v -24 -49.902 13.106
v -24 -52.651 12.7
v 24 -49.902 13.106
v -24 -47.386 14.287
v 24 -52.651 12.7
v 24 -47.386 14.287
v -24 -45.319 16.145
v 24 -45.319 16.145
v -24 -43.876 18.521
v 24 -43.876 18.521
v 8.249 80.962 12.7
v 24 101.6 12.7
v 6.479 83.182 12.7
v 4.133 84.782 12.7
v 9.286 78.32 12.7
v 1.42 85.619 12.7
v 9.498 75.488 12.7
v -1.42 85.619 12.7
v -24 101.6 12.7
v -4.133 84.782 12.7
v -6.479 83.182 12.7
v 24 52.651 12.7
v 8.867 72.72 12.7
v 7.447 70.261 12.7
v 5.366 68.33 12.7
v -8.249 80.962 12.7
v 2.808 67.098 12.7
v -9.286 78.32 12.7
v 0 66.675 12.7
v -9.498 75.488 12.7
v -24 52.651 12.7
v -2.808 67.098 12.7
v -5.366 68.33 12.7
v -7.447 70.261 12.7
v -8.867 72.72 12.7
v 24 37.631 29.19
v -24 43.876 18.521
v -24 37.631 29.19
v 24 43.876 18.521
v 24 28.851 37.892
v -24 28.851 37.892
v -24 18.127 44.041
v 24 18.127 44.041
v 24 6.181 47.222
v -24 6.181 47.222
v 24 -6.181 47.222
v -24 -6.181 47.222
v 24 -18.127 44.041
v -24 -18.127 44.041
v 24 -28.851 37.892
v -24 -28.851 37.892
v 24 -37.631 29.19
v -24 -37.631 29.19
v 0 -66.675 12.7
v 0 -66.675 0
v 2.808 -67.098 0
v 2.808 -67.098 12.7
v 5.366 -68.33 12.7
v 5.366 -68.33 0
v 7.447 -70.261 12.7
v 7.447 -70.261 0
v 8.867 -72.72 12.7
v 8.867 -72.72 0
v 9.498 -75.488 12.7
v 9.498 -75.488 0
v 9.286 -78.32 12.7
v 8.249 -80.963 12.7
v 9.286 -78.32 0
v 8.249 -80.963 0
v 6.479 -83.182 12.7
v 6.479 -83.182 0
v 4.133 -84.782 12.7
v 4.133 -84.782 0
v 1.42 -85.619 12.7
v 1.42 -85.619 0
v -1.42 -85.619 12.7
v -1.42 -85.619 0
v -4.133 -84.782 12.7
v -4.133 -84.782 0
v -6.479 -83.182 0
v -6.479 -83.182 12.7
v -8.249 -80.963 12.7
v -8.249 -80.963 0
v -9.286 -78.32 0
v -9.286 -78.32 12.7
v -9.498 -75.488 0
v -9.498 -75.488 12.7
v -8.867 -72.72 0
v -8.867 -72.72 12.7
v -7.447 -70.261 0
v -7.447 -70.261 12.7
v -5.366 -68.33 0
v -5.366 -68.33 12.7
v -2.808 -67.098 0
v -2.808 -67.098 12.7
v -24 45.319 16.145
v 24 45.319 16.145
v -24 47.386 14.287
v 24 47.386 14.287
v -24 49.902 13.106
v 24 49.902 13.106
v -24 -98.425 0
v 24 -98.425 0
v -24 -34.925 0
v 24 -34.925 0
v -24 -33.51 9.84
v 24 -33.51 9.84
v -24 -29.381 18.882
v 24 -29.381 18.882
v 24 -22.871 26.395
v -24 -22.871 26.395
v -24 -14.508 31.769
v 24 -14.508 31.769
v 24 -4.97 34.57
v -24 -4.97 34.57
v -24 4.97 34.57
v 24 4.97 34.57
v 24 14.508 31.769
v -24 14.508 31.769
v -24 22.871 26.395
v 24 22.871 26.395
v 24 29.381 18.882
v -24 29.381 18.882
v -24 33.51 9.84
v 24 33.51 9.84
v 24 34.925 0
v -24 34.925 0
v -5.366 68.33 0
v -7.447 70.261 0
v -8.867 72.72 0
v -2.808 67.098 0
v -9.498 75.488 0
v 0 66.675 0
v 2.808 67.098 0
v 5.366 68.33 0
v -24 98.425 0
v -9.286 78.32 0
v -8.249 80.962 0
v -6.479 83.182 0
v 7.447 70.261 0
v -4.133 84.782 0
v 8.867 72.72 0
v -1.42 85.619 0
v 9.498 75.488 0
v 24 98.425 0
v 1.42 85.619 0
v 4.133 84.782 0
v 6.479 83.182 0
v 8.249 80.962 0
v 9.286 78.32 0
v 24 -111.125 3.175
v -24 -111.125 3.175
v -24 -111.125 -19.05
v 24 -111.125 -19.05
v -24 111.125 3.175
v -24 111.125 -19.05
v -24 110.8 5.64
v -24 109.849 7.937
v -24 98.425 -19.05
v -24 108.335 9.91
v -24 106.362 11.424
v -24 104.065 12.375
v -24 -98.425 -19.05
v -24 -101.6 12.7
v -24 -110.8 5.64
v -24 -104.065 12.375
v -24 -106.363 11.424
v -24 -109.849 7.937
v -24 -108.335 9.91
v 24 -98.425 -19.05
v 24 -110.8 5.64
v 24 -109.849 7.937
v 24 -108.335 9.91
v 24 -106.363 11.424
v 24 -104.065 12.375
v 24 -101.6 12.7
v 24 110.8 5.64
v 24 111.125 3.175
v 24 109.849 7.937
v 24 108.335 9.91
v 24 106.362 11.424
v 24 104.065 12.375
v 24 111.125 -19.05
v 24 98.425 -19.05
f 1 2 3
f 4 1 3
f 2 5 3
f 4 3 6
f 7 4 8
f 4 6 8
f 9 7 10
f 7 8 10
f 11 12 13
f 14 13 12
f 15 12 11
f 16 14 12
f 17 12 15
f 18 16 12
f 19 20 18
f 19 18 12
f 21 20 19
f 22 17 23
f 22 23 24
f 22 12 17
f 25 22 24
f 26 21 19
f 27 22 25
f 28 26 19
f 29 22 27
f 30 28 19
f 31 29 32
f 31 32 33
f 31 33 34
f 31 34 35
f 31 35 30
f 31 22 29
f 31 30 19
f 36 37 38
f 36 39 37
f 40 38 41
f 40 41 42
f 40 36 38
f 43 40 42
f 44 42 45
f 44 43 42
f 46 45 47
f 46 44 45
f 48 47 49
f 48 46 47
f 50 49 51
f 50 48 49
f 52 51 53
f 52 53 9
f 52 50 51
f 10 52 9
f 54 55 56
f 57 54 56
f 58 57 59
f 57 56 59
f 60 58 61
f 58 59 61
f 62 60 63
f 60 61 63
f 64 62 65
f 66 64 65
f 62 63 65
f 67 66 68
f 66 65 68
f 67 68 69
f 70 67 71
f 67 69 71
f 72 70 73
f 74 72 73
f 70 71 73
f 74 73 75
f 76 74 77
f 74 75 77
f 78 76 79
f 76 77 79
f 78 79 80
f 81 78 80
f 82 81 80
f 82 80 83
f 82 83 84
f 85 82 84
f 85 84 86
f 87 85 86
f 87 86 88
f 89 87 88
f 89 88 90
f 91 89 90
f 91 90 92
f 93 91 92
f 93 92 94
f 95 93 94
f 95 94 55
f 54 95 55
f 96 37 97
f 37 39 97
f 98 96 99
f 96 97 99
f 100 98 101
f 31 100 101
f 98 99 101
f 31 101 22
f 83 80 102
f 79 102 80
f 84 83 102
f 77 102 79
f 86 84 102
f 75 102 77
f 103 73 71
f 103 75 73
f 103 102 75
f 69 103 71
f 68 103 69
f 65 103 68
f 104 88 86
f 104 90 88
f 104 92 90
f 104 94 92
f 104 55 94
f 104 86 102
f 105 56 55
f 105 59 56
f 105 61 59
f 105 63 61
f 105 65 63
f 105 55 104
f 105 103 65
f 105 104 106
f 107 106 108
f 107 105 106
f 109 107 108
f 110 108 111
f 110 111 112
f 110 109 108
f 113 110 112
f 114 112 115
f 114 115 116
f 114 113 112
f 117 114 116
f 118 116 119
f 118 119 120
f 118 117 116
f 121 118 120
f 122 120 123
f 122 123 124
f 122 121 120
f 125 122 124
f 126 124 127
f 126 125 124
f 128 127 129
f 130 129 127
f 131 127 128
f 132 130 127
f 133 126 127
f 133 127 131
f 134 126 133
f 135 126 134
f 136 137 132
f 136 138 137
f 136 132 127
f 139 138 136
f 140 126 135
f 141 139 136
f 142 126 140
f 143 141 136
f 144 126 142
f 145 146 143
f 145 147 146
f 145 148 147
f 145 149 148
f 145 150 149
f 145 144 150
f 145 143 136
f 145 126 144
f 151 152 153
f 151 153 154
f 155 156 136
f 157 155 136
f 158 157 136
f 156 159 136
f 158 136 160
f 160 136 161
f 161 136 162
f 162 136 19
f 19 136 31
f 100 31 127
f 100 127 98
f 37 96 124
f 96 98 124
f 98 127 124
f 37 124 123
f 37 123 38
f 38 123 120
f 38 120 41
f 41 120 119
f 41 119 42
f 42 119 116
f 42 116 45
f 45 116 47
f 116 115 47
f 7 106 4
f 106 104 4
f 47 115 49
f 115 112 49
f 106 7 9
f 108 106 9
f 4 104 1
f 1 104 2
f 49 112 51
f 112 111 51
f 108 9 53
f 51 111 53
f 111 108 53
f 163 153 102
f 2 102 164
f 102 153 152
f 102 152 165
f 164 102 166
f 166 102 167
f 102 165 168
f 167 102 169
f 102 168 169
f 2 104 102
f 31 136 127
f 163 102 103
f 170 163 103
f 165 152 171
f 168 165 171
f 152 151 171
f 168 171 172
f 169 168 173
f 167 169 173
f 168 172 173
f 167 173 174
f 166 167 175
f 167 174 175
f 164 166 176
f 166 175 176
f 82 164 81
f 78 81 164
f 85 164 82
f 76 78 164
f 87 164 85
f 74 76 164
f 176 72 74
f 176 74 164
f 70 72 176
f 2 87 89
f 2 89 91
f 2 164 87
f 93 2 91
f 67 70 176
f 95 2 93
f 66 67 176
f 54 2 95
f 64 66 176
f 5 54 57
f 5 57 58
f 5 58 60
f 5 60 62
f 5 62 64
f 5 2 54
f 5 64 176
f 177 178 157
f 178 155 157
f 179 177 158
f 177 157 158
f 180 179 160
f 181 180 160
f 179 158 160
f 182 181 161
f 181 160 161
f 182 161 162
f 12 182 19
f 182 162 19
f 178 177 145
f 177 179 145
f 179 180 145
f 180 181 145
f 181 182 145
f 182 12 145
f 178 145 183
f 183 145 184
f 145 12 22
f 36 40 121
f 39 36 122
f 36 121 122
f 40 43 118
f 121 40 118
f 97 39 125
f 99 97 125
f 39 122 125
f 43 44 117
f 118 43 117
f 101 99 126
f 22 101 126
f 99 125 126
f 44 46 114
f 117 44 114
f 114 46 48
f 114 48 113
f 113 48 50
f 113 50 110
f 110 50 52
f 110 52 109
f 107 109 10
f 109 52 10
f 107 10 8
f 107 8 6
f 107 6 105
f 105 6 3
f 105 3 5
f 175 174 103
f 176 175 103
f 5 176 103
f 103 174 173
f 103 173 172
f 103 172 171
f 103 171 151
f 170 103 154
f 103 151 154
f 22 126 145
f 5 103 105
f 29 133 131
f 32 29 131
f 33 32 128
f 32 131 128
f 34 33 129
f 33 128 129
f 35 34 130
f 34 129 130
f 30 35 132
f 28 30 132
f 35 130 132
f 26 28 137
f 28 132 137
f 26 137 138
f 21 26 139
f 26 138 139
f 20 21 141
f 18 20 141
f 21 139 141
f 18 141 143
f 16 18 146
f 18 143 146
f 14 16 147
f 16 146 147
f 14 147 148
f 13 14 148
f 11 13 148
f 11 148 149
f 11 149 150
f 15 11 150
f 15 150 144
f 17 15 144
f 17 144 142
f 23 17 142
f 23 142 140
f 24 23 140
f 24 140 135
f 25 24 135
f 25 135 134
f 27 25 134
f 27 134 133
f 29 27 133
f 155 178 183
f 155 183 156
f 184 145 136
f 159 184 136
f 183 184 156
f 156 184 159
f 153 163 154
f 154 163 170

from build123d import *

# Parameters (mm, degrees)
F1_DEPTH  = 24
F2_W      = 48
F2_H      = 12.7
F2_H_2    = 19.05
F3_DEPTH  = 12.7
F4_R      = 9.525
F6_R      = 9.525
F8_DEPTH  = 47.498
F10_DEPTH = 25.4
F5_W      = 48
F5_H      = 19.05
F5_H_2    = 12.7
F11_DEPTH = 12.7
F12_R     = 9.525
F15_DEPTH = 25.4


# Not quite as in the source:
# - two fillets or chamfers of one size are made in one step
# - a feature names something its author has since deleted; it is built from what else it names


with BuildPart() as f1:
    # F0 (on Right) → F1 (new body, symmetric)
    with BuildSketch(Plane.YZ):
        with BuildLine():
            ThreePointArc((-34.925, 0), (0, 34.925), (34.925, 0))
            Line((34.925, 0), (98.425, 0))
            Line((98.425, 0), (98.425, 12.7))
            Line((98.425, 12.7), (87.425, 12.7))
            Line((87.425, 12.7), (45.900442536, 12.7))
            ThreePointArc((45.900442536, 12.7), (0, 47.625), (-45.900442536, 12.7))
            Line((-45.900442536, 12.7), (-98.425, 12.7))
            Line((-98.425, 12.7), (-98.425, 0))
            Line((-98.425, 0), (-34.925, 0))
        make_face()
    extrude(amount=F1_DEPTH, both=True)

    # F2 (on face) → F3 (join)
    with BuildSketch(Plane.XZ.offset(98.425)):
        with Locations((0, 6.35)):
            Rectangle(F2_W, F2_H)
        with Locations((0, -9.525)):
            Rectangle(F2_W, F2_H_2)
    extrude(amount=F3_DEPTH)

    # F4
    f4_edges = [f1.edges().sort_by_distance(p)[0] for p in [
        (0, -111.125, 12.7),
    ]]
    fillet(f4_edges, radius=F4_R)

    # F6
    f6_edges = [f1.edges().sort_by_distance(p)[0] for p in [
        (0, -45.900443, 12.7),
        (0, 45.900443, 12.7),
    ]]
    fillet(f6_edges, radius=F6_R)

    # F7 (on face) → F8 (cut)
    with BuildSketch(Plane(origin=(0, 0, 0), x_dir=(1, 0, 0), z_dir=(0, 0, -1))):
        with BuildLine():
            ThreePointArc((9.525, 76.2), (-6.7351920908, 82.9351920908), (0, 66.675))
            ThreePointArc((0, 66.675), (6.7351920908, 69.4648079092), (9.525, 76.2))
        make_face()
    extrude(amount=-F8_DEPTH, mode=Mode.SUBTRACT)

    # F9 (on face) → F10 (cut)
    with BuildSketch(Plane(origin=(0, 0, 0), x_dir=(1, 0, 0), z_dir=(0, 0, -1))):
        with BuildLine():
            ThreePointArc((9.525, -6.35), (6.7351920908, 0.3851920908), (0, 3.175))
            ThreePointArc((0, 3.175), (-6.7351920908, -13.0851920908), (9.525, -6.35))
        make_face()
    extrude(amount=-F10_DEPTH, mode=Mode.SUBTRACT)

    # F5 (on face) → F11 (join)
    with BuildSketch(Plane(origin=(0, 98.425, 0), x_dir=(-1, 0, 0), z_dir=(0, 1, 0))):
        with Locations((0, -9.525)):
            Rectangle(F5_W, F5_H)
        with Locations((0, 6.35)):
            Rectangle(F5_W, F5_H_2)
    extrude(amount=F11_DEPTH)

    # F12
    f12_edges = [f1.edges().sort_by_distance(p)[0] for p in [
        (0, 111.125, 12.7),
    ]]
    fillet(f12_edges, radius=F12_R)

    # F14 (on face) → F15 (cut)
    with BuildSketch(Plane(origin=(0, 0, 0), x_dir=(1, 0, 0), z_dir=(0, 0, -1))):
        with BuildLine():
            ThreePointArc((9.525, -76.2), (6.7351920908, -69.4648079092), (0, -66.675))
            ThreePointArc((0, -66.675), (-6.7351920908, -82.9351920908), (9.525, -76.2))
        make_face()
    extrude(amount=-F15_DEPTH, mode=Mode.SUBTRACT)


solid = f1.part
